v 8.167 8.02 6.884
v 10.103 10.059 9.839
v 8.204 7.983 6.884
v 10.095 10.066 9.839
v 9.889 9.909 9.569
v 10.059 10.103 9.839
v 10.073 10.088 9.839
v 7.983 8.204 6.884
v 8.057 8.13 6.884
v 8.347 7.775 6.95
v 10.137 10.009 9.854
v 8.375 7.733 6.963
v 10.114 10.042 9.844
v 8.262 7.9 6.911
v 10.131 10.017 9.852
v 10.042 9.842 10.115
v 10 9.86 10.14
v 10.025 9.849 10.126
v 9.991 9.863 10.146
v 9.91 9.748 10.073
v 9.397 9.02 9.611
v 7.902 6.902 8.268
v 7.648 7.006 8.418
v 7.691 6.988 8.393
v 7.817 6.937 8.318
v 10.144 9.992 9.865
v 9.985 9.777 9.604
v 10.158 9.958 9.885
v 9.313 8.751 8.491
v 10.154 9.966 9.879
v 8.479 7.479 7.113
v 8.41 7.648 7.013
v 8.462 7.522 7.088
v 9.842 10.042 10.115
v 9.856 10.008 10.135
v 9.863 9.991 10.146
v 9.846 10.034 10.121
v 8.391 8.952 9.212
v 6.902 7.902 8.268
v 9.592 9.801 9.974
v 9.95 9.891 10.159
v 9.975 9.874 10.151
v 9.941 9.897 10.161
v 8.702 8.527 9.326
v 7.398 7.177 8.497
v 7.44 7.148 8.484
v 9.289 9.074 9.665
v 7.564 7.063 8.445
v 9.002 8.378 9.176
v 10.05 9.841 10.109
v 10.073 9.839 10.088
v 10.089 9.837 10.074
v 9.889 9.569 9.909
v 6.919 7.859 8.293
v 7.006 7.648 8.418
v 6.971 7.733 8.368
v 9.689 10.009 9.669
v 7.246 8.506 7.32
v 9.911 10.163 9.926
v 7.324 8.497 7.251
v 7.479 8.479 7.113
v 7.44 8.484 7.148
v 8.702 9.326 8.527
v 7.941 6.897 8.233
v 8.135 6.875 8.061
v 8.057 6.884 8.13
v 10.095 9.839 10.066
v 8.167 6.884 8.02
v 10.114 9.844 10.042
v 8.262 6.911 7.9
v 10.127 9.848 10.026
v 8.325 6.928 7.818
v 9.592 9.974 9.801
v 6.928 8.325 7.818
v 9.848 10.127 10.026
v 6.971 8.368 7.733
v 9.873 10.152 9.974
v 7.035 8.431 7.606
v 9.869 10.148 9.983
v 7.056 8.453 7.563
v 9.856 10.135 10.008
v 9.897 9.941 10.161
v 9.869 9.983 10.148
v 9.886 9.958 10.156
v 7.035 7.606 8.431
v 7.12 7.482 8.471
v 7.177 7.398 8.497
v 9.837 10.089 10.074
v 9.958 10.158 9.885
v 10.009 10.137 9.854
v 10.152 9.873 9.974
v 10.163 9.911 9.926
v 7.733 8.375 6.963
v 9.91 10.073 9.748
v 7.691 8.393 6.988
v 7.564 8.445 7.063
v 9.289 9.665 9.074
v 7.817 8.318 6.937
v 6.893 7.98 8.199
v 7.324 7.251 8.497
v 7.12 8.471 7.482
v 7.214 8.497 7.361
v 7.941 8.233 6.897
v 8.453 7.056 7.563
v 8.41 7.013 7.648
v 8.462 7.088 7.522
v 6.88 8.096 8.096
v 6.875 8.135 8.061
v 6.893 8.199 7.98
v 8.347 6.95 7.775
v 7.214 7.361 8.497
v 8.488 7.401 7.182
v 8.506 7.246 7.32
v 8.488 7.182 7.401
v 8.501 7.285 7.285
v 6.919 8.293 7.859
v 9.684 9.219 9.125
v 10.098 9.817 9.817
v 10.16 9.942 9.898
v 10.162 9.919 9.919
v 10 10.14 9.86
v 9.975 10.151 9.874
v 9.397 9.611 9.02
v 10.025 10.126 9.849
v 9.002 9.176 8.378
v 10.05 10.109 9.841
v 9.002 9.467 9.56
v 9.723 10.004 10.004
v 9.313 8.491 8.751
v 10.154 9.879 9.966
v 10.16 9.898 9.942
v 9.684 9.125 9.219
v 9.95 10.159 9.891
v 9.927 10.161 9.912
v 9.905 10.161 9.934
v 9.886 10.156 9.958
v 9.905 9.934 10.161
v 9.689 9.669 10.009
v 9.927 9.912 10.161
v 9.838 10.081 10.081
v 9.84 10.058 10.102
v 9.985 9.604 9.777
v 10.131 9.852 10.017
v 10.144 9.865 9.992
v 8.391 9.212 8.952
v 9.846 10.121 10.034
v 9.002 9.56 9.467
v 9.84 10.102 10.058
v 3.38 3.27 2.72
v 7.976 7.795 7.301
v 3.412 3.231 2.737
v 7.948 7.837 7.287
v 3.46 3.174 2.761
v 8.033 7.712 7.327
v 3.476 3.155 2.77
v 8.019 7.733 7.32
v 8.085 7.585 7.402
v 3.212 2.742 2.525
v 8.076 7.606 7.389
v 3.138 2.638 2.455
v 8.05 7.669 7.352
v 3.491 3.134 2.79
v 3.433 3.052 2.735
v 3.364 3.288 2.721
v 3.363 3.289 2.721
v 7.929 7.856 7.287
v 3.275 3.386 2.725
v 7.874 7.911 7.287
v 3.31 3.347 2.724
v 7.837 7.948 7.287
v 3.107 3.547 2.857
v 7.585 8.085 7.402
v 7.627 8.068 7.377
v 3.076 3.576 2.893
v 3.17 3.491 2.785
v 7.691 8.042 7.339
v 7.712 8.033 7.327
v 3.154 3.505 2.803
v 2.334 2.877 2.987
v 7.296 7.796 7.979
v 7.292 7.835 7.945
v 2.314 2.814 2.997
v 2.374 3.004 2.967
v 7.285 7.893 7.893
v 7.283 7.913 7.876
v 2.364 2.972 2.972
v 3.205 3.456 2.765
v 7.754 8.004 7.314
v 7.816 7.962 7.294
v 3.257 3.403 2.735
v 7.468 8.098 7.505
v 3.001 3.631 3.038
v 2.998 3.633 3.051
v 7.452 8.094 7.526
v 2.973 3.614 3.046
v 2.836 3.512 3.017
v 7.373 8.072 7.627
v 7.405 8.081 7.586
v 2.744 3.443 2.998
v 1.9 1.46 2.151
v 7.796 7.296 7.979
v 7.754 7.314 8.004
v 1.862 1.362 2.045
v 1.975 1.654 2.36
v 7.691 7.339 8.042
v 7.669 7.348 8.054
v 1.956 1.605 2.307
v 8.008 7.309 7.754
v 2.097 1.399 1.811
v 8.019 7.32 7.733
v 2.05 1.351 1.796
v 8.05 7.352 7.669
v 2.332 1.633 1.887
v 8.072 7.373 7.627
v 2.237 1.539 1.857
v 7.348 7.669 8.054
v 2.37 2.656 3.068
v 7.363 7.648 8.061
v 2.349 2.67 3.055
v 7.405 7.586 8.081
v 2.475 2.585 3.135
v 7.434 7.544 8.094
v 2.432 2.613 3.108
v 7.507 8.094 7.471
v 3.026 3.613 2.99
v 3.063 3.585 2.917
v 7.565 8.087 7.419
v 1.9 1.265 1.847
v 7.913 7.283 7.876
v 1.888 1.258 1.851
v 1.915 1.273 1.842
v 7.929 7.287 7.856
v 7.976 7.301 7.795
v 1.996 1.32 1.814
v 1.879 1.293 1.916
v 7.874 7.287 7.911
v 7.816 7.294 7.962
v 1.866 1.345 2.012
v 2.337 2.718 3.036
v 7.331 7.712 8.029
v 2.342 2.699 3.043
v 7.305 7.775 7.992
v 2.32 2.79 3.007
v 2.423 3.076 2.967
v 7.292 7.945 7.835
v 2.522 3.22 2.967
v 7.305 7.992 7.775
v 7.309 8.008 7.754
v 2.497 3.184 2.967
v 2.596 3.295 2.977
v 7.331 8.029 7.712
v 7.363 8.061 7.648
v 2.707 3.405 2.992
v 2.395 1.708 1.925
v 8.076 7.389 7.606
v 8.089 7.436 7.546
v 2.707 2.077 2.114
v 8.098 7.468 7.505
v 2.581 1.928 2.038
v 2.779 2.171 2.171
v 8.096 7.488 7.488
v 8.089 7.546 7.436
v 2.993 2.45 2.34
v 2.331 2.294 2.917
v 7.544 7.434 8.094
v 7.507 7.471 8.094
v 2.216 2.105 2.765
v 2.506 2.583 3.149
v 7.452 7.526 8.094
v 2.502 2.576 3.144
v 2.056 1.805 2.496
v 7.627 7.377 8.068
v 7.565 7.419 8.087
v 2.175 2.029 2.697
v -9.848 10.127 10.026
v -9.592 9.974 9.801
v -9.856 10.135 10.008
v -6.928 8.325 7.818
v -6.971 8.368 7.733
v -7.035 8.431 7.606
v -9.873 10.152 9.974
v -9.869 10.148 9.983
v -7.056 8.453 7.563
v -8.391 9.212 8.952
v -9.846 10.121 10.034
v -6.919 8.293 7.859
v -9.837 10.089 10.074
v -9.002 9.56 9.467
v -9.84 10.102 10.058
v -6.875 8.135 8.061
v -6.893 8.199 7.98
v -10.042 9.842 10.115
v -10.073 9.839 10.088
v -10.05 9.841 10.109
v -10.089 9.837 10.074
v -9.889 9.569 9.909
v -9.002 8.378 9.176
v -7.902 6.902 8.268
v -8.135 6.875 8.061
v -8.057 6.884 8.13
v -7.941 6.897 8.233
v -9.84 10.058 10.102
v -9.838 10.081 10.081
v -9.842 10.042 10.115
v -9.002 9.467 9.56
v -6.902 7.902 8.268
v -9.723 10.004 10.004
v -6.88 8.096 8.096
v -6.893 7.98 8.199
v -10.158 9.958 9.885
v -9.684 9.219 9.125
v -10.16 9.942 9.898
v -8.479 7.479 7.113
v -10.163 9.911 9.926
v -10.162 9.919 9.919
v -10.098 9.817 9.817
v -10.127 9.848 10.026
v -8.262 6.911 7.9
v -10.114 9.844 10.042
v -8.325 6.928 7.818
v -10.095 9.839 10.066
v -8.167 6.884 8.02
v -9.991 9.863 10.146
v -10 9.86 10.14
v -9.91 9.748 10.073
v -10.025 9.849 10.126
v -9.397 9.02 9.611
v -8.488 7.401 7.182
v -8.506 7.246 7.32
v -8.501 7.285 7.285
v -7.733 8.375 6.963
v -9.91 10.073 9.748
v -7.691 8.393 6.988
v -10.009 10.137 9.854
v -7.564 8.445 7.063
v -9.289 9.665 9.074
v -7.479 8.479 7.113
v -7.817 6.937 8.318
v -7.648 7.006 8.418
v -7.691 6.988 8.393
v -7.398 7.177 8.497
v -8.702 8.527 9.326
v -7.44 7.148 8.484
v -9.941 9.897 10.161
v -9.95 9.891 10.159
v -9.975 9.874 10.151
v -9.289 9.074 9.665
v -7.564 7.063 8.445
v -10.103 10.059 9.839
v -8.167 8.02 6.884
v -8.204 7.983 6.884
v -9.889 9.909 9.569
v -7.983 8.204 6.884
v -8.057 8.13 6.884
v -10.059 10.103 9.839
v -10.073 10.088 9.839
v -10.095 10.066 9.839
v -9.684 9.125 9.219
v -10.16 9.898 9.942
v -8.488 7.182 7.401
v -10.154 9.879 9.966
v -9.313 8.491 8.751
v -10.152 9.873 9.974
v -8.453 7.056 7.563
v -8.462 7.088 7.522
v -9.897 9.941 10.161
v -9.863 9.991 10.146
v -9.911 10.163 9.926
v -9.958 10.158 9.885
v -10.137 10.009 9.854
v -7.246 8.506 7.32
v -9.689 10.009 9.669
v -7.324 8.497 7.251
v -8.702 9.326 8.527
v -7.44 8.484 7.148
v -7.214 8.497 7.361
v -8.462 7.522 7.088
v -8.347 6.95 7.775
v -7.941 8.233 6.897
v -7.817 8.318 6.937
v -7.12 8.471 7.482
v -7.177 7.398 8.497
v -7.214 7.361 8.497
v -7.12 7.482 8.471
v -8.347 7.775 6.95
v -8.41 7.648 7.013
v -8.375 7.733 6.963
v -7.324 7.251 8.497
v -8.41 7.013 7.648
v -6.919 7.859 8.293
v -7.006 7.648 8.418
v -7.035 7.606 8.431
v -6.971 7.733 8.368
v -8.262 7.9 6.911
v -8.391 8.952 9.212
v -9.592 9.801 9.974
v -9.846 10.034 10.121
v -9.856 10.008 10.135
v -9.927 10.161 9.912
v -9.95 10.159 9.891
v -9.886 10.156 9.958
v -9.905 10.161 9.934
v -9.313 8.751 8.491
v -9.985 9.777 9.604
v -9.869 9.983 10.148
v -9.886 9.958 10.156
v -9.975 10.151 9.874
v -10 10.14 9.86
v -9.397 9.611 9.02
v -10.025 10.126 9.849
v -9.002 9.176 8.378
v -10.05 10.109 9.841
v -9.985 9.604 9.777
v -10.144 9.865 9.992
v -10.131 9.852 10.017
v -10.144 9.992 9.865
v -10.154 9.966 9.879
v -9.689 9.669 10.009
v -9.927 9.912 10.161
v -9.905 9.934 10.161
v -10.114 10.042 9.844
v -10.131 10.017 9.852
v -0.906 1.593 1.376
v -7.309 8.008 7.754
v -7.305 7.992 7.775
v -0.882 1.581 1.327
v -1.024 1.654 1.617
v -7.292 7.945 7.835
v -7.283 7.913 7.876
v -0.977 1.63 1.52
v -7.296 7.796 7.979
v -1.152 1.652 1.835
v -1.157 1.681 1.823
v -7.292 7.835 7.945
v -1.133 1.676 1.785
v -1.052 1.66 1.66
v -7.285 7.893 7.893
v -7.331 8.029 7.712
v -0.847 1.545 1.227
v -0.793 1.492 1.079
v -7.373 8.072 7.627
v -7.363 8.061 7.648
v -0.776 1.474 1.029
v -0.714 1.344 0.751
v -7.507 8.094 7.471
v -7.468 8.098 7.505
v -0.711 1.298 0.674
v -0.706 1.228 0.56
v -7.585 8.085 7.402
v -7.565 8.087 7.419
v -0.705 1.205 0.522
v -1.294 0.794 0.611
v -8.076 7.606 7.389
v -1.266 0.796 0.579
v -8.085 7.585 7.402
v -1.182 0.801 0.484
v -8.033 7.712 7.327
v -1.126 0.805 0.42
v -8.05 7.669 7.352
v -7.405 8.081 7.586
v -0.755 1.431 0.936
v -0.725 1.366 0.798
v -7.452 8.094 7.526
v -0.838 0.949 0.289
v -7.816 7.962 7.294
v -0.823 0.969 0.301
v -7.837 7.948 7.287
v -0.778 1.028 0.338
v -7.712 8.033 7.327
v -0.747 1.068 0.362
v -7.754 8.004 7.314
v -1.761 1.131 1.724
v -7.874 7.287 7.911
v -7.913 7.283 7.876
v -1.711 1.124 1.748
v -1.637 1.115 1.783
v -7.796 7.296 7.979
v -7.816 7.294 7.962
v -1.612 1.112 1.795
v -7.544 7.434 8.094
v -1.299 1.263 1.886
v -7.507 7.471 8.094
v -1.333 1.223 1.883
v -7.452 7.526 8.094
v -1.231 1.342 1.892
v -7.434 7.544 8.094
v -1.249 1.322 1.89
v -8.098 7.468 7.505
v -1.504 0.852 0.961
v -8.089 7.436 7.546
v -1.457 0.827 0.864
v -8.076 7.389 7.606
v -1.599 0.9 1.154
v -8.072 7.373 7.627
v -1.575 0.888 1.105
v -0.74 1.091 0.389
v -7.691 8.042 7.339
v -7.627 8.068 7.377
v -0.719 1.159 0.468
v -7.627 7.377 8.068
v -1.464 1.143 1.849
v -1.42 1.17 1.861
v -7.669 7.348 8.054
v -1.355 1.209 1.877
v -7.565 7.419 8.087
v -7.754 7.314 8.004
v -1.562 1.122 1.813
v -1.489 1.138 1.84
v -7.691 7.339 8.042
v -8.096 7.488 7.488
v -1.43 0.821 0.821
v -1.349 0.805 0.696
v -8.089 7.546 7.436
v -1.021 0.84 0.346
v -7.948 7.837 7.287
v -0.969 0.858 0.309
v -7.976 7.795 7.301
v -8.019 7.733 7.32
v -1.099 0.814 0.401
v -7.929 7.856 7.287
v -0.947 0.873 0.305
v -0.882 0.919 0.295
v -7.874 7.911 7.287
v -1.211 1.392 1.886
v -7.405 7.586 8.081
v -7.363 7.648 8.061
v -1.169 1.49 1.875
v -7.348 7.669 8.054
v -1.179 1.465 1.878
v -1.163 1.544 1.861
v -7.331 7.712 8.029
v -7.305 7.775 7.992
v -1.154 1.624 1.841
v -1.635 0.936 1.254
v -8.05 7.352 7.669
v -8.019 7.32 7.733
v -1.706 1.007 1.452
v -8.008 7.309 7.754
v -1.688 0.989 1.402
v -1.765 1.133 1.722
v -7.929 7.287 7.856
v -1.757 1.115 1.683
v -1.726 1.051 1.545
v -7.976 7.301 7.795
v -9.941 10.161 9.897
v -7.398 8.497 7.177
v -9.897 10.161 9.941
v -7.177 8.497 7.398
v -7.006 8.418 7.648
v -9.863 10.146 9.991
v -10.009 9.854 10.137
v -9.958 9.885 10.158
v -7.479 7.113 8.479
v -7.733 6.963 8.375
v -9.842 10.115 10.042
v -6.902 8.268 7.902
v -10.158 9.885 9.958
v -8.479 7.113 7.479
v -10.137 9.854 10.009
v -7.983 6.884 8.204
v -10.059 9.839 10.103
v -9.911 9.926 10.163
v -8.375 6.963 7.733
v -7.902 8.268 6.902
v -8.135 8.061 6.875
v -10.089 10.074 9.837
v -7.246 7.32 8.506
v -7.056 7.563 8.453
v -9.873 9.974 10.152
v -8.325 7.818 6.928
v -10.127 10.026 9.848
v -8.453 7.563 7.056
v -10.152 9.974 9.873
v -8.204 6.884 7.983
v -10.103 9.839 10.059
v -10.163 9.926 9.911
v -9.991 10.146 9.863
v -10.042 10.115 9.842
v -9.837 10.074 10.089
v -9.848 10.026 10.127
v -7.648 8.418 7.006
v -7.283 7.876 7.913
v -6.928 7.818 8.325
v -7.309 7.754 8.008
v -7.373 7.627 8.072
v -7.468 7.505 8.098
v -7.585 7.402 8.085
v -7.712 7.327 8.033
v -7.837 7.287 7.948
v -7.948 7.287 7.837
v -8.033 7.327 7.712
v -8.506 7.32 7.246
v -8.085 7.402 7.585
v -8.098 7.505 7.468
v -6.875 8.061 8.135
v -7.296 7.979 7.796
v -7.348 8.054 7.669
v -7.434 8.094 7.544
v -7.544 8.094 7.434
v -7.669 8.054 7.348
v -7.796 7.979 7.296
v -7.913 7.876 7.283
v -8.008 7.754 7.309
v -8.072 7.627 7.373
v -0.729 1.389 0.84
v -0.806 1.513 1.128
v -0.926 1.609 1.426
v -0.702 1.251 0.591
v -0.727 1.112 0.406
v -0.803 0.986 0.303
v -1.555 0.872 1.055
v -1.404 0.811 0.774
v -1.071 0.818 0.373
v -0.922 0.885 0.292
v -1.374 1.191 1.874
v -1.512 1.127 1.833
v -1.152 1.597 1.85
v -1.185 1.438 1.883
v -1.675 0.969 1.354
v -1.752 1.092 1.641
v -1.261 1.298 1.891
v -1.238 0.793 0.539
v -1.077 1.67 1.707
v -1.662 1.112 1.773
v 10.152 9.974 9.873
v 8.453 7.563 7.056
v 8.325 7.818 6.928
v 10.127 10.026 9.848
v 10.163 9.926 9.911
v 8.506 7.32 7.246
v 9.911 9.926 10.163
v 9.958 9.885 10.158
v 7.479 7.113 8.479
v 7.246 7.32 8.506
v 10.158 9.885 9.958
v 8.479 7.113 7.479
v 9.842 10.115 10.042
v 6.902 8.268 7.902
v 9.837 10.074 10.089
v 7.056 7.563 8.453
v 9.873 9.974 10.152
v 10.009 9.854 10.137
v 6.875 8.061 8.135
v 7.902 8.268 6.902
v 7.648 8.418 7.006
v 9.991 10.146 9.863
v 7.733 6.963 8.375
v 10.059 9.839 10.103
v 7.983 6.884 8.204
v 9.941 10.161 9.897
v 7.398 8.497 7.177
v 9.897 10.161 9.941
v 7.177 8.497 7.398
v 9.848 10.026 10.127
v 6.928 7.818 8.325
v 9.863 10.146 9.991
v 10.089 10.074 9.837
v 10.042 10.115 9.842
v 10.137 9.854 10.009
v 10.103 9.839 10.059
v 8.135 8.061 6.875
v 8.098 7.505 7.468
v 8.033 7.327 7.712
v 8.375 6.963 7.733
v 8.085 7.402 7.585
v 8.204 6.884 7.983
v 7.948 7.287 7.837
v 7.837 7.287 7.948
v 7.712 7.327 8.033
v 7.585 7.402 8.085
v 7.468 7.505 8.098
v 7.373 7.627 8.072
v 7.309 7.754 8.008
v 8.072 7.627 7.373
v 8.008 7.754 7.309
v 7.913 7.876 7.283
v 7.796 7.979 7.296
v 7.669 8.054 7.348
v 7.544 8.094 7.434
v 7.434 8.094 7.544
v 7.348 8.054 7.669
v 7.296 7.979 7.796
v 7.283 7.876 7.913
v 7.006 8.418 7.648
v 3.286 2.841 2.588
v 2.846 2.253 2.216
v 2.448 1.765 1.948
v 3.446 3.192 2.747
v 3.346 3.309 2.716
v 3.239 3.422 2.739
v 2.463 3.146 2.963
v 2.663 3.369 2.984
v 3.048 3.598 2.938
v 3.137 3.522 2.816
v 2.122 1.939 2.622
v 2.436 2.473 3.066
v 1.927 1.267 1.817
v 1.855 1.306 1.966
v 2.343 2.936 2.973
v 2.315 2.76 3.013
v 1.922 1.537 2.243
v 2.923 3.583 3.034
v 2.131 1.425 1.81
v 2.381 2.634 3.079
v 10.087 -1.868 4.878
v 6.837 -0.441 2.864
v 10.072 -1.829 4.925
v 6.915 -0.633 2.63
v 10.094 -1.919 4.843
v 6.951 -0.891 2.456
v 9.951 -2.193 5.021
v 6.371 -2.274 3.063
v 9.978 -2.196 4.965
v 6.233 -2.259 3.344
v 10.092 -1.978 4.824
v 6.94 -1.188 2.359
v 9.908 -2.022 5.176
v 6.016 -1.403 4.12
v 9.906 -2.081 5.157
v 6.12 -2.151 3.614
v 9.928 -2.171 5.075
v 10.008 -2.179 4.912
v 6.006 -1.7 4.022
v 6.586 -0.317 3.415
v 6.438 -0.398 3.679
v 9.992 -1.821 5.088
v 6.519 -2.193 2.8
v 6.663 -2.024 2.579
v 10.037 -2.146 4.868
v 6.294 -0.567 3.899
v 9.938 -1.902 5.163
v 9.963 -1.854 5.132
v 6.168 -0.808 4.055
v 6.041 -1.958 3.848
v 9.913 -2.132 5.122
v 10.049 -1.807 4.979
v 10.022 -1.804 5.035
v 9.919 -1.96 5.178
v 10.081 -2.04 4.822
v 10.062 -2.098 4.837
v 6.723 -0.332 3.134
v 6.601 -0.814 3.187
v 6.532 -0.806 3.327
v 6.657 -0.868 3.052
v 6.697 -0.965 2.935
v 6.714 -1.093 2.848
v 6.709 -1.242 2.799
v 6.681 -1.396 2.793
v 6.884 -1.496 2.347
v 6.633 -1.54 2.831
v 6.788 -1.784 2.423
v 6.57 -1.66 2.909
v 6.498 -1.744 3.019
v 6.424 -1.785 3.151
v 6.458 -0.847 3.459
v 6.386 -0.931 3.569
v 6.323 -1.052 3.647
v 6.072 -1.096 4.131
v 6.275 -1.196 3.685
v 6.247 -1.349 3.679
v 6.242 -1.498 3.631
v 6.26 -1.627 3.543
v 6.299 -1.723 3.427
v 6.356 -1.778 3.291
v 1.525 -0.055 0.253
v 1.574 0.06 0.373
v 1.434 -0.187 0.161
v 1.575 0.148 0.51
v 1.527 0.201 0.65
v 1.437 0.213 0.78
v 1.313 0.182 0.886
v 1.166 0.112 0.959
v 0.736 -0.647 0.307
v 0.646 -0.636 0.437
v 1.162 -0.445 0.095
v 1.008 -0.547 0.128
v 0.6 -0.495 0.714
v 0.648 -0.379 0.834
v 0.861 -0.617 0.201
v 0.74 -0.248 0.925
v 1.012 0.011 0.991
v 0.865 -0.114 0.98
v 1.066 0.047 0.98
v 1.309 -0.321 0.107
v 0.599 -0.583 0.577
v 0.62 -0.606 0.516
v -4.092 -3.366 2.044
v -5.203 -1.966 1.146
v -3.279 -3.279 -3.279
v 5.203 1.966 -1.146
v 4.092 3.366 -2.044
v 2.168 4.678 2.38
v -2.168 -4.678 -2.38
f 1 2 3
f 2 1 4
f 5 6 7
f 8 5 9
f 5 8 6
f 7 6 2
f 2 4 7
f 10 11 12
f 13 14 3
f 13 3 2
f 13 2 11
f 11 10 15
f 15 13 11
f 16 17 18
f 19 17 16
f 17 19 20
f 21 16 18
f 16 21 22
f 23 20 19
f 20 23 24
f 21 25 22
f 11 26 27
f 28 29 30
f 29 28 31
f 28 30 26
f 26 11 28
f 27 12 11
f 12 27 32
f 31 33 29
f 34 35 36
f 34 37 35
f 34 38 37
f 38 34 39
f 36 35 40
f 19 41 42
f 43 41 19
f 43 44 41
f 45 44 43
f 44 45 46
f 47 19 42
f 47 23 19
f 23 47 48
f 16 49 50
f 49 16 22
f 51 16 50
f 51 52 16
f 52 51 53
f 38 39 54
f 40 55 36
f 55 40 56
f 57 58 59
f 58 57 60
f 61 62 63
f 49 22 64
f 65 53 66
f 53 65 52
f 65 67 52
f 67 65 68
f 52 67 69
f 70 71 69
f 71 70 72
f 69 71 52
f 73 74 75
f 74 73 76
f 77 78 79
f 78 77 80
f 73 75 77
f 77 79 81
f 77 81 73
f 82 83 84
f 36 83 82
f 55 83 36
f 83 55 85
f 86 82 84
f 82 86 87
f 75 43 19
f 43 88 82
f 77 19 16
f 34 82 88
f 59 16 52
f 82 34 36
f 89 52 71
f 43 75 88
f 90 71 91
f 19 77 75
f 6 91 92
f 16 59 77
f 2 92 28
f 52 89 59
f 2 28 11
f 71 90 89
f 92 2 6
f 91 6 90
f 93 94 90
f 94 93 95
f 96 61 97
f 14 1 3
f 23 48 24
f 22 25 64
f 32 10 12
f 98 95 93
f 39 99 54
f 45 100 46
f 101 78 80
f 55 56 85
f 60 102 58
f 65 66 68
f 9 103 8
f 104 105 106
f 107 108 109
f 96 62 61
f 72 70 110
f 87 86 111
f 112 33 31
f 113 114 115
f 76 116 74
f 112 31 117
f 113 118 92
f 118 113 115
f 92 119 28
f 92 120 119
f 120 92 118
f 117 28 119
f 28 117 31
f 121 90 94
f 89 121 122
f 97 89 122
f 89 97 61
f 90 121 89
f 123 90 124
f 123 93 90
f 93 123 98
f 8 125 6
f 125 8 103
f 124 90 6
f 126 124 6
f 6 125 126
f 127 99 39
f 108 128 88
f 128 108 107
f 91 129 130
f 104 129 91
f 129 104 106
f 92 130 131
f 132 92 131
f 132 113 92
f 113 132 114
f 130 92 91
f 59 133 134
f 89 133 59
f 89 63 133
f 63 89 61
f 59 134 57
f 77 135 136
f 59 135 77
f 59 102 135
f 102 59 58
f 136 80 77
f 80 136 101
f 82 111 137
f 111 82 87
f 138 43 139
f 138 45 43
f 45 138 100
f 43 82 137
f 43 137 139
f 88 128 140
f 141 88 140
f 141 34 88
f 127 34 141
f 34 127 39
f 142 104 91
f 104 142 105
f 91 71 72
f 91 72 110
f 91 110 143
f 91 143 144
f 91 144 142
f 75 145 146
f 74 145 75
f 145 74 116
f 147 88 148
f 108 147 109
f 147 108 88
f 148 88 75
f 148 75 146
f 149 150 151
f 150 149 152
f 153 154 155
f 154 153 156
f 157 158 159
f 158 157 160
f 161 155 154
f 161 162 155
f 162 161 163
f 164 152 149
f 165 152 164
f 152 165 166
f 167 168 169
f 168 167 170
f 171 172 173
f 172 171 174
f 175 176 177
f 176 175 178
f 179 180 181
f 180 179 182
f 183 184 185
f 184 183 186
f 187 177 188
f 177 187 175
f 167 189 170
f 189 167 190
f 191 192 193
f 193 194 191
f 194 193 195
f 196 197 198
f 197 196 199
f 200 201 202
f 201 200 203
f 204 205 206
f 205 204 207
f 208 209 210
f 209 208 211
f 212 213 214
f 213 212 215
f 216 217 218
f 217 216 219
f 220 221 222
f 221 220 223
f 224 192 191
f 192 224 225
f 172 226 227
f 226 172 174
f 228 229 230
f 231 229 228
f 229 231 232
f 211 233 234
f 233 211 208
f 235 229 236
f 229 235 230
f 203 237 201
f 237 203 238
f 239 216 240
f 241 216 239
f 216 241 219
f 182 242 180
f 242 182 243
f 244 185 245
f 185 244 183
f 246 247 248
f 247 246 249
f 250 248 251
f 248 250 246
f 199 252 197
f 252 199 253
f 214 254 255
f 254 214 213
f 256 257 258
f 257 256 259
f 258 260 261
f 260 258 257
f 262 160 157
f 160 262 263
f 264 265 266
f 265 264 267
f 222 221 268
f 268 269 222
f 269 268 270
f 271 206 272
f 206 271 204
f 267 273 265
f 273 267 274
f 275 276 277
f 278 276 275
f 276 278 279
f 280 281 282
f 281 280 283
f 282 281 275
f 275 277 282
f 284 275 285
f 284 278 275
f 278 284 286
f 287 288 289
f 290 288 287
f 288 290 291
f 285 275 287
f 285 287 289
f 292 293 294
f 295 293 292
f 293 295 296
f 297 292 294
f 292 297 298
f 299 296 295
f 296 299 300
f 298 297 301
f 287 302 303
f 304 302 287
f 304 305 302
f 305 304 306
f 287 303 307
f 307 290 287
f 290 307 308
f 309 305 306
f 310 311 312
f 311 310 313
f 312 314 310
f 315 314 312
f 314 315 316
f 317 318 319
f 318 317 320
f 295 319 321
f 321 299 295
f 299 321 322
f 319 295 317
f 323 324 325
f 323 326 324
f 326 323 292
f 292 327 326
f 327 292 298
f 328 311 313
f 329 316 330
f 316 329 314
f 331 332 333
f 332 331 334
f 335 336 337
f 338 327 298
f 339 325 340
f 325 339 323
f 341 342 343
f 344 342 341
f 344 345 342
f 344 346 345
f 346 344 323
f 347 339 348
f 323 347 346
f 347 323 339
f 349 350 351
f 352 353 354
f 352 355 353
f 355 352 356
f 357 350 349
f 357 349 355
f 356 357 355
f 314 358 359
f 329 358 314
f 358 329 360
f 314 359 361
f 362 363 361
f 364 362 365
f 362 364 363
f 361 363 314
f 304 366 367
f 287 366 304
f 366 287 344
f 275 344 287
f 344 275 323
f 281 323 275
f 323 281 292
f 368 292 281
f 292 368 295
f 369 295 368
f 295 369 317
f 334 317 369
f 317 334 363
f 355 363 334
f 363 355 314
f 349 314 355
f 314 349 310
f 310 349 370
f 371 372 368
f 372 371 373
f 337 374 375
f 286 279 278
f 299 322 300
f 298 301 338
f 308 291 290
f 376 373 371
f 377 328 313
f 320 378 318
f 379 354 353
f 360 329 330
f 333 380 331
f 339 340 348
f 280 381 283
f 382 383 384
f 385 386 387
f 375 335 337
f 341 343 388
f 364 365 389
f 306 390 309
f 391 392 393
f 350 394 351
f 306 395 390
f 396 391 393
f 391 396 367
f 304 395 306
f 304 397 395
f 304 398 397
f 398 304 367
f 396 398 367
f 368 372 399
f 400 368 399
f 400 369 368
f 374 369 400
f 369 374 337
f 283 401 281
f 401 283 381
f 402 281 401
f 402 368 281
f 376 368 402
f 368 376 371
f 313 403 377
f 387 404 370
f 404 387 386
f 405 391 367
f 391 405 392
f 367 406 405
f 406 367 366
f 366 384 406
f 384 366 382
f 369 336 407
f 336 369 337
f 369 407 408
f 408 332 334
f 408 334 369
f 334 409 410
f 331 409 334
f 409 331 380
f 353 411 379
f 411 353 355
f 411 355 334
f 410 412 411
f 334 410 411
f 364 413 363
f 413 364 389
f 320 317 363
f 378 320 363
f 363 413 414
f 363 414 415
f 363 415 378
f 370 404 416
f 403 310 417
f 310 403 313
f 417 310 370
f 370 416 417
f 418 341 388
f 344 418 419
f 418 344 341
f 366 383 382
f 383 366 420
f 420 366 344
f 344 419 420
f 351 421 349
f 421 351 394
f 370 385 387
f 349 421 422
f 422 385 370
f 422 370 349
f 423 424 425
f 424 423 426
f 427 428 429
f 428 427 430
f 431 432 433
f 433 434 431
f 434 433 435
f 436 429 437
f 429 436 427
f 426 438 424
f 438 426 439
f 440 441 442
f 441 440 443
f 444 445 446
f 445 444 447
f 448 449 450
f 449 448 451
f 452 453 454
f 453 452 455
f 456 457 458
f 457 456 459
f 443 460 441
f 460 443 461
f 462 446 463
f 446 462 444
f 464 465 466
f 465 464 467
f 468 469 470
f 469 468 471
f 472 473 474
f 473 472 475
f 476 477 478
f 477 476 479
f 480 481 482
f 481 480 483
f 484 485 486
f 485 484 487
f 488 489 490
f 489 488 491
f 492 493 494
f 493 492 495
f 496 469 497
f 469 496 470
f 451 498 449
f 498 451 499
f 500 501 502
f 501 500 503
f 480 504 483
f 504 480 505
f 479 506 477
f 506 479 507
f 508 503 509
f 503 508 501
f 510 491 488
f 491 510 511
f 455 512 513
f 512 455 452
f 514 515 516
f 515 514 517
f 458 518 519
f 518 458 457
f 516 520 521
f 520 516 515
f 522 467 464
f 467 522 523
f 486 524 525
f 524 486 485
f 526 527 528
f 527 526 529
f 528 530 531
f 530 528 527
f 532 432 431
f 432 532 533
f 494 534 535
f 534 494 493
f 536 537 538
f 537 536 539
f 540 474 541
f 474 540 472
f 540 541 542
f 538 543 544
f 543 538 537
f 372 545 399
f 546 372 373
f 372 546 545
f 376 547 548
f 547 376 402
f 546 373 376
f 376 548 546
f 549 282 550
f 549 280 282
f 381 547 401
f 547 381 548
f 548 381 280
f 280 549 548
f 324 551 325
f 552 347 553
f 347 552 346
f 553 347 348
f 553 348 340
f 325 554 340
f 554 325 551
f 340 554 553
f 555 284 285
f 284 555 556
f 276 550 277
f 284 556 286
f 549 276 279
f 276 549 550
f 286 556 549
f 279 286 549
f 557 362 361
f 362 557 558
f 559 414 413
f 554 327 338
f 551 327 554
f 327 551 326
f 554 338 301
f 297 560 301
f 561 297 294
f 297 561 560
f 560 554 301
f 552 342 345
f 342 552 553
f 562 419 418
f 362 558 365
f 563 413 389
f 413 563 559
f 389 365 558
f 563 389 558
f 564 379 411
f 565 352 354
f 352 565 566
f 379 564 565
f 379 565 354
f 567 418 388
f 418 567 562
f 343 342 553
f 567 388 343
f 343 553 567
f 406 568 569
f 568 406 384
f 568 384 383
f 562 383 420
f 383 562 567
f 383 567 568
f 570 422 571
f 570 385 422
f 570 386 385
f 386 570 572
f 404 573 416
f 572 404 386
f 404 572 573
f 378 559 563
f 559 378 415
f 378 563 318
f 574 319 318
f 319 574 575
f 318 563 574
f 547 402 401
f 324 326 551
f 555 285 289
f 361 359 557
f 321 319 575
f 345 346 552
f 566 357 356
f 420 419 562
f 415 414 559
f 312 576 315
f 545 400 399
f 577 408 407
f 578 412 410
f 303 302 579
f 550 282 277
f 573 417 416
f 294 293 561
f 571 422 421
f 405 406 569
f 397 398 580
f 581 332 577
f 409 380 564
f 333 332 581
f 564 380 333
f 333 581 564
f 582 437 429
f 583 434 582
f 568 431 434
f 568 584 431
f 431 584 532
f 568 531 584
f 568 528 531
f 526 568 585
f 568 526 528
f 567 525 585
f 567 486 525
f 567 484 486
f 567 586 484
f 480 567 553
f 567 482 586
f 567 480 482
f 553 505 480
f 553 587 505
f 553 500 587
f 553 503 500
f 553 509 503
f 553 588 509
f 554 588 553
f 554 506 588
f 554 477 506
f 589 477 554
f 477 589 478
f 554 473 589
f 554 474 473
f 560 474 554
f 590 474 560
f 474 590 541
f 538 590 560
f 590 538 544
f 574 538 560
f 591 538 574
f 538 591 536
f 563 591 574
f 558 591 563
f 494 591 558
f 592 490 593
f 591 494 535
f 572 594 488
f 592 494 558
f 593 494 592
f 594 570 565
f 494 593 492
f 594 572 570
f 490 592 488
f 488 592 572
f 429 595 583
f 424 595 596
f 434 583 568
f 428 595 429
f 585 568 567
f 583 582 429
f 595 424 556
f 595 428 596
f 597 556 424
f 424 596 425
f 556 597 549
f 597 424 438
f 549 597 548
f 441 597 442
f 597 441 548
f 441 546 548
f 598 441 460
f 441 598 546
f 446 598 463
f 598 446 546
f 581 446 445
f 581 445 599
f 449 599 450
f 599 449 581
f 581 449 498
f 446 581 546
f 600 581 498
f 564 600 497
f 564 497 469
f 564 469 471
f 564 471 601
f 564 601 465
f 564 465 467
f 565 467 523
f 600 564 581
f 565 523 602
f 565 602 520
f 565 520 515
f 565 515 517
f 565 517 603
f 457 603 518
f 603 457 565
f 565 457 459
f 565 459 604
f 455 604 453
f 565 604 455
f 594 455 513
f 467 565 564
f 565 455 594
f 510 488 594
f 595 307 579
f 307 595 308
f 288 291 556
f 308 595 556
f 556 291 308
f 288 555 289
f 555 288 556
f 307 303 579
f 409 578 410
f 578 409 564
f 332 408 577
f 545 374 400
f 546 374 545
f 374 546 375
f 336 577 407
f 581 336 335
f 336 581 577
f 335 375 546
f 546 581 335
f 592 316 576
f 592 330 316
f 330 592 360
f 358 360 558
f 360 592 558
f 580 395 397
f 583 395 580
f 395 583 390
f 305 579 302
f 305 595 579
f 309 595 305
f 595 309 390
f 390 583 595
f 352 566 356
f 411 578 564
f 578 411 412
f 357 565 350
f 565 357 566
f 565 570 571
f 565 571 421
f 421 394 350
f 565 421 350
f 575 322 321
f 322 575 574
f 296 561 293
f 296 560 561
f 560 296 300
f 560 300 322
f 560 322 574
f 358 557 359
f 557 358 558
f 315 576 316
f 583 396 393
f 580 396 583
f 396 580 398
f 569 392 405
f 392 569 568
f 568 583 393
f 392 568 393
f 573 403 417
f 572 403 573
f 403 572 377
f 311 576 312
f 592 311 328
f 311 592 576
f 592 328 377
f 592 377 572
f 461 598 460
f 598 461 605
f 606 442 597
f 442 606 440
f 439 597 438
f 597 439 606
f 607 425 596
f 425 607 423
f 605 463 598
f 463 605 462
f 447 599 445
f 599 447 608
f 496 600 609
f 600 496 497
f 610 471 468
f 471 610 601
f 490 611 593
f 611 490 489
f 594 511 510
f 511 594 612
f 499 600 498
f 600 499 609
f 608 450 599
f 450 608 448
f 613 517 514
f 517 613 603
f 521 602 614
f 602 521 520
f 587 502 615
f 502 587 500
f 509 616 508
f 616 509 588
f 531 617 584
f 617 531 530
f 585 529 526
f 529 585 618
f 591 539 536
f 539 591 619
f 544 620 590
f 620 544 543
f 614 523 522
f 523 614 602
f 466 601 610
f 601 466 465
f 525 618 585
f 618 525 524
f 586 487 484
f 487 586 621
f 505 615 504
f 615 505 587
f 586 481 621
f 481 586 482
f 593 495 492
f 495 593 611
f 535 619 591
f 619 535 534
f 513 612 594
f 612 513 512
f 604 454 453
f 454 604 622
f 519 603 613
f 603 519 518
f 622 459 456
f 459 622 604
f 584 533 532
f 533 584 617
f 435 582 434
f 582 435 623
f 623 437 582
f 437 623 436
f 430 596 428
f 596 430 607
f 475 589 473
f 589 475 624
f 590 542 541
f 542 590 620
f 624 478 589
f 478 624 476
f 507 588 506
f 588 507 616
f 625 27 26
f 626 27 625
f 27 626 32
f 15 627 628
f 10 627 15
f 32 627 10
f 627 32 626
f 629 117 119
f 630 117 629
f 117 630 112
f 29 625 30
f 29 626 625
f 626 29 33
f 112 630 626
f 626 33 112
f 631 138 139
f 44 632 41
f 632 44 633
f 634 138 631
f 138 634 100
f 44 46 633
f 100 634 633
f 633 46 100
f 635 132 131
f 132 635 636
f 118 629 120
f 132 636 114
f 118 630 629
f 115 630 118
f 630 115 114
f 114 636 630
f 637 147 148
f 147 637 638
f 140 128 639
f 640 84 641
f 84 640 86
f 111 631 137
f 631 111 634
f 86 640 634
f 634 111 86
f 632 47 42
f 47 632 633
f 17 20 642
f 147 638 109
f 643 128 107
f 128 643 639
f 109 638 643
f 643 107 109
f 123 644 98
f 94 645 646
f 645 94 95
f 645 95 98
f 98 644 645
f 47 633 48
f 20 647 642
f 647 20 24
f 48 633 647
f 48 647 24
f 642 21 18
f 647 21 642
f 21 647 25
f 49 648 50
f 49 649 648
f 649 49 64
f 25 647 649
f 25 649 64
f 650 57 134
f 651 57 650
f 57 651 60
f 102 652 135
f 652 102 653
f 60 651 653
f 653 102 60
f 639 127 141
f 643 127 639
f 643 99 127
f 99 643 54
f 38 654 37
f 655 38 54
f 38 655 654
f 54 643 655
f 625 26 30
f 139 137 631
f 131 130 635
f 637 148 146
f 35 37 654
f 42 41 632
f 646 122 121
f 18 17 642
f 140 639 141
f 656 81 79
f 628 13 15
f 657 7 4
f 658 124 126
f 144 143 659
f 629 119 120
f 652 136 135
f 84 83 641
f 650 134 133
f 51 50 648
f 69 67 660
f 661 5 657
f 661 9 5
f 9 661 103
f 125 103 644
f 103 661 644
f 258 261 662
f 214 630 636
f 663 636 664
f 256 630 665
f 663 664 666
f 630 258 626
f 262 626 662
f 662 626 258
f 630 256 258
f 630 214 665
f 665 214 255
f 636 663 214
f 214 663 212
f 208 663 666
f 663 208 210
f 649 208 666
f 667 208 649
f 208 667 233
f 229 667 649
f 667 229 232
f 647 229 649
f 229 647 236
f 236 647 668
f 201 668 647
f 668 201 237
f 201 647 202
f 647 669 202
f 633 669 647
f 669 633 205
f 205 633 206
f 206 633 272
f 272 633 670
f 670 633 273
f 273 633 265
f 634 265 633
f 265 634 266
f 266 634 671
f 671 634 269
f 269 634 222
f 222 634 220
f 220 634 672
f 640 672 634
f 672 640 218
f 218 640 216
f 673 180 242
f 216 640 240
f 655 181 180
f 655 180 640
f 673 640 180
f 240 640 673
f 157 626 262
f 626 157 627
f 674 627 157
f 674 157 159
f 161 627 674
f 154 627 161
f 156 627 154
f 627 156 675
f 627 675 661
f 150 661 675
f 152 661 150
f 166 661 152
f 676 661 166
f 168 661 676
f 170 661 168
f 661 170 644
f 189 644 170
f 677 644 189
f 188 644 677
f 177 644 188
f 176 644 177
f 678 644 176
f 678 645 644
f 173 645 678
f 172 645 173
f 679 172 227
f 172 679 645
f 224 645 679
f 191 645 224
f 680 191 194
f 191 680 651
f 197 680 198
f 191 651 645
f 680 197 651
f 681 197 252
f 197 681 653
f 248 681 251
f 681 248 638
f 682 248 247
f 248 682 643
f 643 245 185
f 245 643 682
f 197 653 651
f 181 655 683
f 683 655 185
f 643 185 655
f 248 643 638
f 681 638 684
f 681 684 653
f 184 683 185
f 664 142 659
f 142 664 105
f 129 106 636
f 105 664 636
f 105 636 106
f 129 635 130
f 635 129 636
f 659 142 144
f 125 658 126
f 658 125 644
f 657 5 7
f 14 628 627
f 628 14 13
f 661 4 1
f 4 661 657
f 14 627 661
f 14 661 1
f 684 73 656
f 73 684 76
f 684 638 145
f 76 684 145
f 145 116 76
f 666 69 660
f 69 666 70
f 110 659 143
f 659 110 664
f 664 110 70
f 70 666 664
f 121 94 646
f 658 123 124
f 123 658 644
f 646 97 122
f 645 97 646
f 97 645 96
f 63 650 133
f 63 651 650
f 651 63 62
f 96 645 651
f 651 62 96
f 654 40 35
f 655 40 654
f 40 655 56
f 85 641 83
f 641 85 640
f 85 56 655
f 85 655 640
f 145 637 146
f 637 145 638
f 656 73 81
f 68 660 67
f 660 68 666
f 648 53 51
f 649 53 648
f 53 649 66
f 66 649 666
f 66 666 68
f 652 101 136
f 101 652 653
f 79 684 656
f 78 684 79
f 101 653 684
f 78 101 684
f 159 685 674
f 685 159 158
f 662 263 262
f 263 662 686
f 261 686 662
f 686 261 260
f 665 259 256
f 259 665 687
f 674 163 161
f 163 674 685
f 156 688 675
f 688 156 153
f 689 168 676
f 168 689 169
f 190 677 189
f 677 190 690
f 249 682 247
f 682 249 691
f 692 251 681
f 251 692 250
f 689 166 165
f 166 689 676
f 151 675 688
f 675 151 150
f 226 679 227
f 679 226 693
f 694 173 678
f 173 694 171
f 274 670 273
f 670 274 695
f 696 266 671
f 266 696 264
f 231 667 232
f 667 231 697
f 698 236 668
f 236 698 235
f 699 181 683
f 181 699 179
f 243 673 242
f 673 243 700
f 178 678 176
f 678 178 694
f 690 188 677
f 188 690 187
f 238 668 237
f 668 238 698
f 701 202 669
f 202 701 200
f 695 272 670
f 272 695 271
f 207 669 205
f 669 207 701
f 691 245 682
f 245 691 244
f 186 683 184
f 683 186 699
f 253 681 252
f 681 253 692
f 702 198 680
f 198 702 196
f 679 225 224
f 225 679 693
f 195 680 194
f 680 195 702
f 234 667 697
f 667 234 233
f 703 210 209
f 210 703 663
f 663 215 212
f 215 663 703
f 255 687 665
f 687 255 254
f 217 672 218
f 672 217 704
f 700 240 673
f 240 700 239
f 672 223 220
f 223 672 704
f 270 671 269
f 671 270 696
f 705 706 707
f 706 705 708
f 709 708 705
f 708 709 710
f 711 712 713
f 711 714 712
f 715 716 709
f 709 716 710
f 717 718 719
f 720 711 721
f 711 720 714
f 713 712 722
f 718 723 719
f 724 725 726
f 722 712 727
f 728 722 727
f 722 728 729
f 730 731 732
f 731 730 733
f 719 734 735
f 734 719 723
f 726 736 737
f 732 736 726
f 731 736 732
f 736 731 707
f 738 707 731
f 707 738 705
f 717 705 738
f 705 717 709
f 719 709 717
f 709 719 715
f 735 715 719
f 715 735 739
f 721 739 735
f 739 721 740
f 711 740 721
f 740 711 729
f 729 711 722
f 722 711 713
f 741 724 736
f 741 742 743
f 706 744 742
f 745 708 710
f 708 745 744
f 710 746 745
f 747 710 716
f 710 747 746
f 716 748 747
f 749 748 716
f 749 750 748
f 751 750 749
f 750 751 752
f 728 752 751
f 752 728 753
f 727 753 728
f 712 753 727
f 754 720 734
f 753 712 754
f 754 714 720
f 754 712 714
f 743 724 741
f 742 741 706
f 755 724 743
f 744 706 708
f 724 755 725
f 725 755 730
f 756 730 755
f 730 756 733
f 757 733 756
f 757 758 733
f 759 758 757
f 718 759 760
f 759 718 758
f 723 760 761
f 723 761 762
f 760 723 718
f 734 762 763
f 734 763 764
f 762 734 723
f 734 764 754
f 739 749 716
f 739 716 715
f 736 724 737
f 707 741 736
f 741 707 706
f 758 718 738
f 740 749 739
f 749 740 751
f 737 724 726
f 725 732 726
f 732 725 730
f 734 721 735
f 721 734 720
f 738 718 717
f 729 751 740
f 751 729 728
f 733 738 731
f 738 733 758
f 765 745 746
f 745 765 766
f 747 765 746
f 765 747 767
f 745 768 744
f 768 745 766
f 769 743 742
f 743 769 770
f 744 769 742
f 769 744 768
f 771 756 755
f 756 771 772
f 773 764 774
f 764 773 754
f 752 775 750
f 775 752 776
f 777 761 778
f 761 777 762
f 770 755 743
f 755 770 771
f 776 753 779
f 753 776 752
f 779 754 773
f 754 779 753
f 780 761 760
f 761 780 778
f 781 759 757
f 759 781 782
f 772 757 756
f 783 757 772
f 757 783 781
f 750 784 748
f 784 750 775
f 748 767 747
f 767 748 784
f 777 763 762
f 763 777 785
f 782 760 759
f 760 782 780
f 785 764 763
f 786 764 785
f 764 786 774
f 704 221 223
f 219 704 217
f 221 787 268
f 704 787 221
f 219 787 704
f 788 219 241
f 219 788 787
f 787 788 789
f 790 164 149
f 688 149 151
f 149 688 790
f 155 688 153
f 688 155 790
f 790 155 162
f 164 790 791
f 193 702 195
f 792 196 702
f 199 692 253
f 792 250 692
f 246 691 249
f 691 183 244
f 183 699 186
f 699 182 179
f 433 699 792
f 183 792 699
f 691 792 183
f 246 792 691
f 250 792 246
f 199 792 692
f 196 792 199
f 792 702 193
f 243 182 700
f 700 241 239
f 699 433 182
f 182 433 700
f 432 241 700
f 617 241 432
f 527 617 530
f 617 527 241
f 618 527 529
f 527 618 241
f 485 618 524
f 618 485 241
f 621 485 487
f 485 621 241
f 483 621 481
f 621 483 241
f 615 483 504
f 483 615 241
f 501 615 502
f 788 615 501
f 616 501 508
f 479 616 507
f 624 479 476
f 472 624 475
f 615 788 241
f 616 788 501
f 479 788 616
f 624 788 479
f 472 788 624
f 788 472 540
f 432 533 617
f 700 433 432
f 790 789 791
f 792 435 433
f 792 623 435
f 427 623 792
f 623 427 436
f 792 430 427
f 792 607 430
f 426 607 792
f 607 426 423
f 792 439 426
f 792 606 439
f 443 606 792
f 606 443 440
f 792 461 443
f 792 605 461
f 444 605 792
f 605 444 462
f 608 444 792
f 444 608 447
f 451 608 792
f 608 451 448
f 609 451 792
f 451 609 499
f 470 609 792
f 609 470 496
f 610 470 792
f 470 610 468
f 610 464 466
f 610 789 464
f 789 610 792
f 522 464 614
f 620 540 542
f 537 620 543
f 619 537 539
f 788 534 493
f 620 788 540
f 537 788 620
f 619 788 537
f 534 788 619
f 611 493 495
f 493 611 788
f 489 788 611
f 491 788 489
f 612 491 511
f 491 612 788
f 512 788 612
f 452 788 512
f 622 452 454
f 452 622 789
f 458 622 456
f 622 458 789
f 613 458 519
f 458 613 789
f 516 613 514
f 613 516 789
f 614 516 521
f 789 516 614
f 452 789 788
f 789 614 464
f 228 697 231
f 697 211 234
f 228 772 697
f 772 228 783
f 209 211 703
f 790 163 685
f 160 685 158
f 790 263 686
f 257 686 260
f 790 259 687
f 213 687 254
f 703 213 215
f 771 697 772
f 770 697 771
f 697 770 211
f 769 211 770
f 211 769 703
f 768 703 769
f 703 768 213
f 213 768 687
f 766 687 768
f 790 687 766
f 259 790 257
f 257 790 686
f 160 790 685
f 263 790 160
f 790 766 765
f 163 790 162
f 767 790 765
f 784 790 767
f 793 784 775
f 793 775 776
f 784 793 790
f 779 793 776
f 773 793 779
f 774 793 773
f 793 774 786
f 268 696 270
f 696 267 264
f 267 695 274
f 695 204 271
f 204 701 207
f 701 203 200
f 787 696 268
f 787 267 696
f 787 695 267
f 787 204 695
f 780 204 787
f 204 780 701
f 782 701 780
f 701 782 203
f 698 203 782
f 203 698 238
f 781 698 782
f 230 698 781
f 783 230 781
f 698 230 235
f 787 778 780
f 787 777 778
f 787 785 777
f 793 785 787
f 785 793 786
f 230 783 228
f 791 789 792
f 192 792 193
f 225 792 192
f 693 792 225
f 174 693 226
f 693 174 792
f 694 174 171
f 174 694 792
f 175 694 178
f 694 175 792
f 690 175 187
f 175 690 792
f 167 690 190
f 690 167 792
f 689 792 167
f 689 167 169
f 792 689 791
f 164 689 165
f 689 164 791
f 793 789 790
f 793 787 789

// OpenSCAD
//---------------------------------------------------------------
//-- Openscad vector library
//-- This is a component of the obiscad opescad tools by Obijuan
//-- (C) Juan Gonzalez-Gomez (Obijuan)
//-- Sep-2012
//---------------------------------------------------------------
//-- Released under the GPL license
//---------------------------------------------------------------

//----------------------------------------
//-- FUNCTIONS FOR WORKING WITH VECTORS
//----------------------------------------

//-- Calculate the module of a vector
function mod(v) = (sqrt(v[0]*v[0]+v[1]*v[1]+v[2]*v[2]));

//-- Calculate the cros product of two vectors
function cross(u,v) = [
  u[1]*v[2] - v[1]*u[2],
  -(u[0]*v[2] - v[0]*u[2]) ,
  u[0]*v[1] - v[0]*u[1]];

//-- Calculate the dot product of two vectors
function dot(u,v) = u[0]*v[0]+u[1]*v[1]+u[2]*v[2];

//-- Return the unit vector of a vector
function unitv(v) = v/mod(v);

//-- Return the angle between two vectores
function anglev(u,v) = acos( dot(u,v) / (mod(u)*mod(v)) );

//----------------------------------------------------------
//--  Draw a point in the position given by the vector p  
//----------------------------------------------------------
module point(p)
{
  translate(p)
    sphere(r=0.7,$fn=20);
}

//------------------------------------------------------------------
//-- Draw a vector poiting to the z axis
//-- This is an auxiliary module for implementing the vector module
//--
//-- Parameters:
//--  l: total vector length (line + arrow)
//--  l_arrow: Vector arrow length
//--  mark: If true, a mark is draw in the vector head, for having
//--    a visual reference of the rolling angle
//------------------------------------------------------------------
module vectorz(l=10, l_arrow=4, mark=false)
{
  //-- vector body length (not including the arrow)
  lb = l - l_arrow;

  //-- The vector is locatead at 0,0,0
  translate([0,0,lb/2])
  union() {

    //-- Draw the arrow
    translate([0,0,lb/2])
      cylinder(r1=2/2, r2=0.2, h=l_arrow, $fn=20);

    //-- Draw the mark
    if (mark) {
      translate([0,0,lb/2+l_arrow/2])
      translate([1,0,0])
        cube([2,0.3,l_arrow*0.8],center=true);
    }

    //-- Draw the body
    cylinder(r=1/2, h=lb, center=true, $fn=20);
  }

  //-- Draw a sphere in the vector base
  sphere(r=1/2, $fn=20);
}

//-----------------------------------------------------------------
//-- ORIENTATE OPERATOR
//--
//--  Orientate an object to the direction given by the vector v
//--  Parameters:
//--    v : Target orientation
//--    vref: Vector reference. It is the vector of the local frame
//--          of the object that want to be poiting in the direction
//--          of v
//--    roll: Rotation of the object around the v axis
//-------------------------------------------------------------------
module orientate(v,vref=[0,0,1], roll=0)
{
  //-- Calculate the rotation axis
  raxis = cross(vref,v);
  
  //-- Calculate the angle between the vectors
  ang = anglev(vref,v);

  //-- Rotate the child!
  rotate(a=roll, v=v)
    rotate(a=ang, v=raxis)
      child(0);
}

//---------------------------------------------------------------------------
//-- Draw a vector 
//--
//-- There are two modes of drawing the vector
//-- * Mode 1: Given by a cartesian point(x,y,z). A vector from the origin
//--           to the end (x,y,z) is drawn. The l parameter (length) must 
//--           be 0  (l=0)
//-- * Mode 2: Give by direction and length
//--           A vector of length l pointing to the direction given by
//--           v is drawn
//---------------------------------------------------------------------------
//-- Parameters:
//--  v: Vector cartesian coordinates
//--  l: total vector length (line + arrow)
//--  l_arrow: Vector arrow length
//    mark: If true, a mark is draw in the vector head, for having
//--    a visual reference of the rolling angle
//---------------------------------------------------------------------------
module vector(v,l=0, l_arrow=4, mark=false)
{
  //-- Get the vector length from the coordinates
  mod = mod(v);

  //-- The vector is very easy implemented by means of the orientate
  //-- operator:
  //--  orientate(v) vectorz(l=mod, l_arrow=l_arrow)
  //--  BUT... in OPENSCAD 2012.02.22 the recursion does not
  //--    not work, so that if the user use the orientate operator
  //--    on a vector, openscad will ignore it..
  //-- The solution at the moment (I hope the openscad developers
  //--  implement the recursion in the near future...)
  //--  is to repite the orientate operation in this module

  //---- SAME CALCULATIONS THAN THE ORIENTATE OPERATOR!
  //-- Calculate the rotation axis

  vref = [0,0,1];
  raxis = cross(vref,v);
  
  //-- Calculate the angle between the vectors
  ang = anglev(vref,v);

  //-- orientate the vector
  //-- Draw the vector. The vector length is given either
  //--- by the mod variable (when l=0) or by l (when l!=0)
  if (l==0)
    rotate(a=ang, v=raxis)
      vectorz(l=mod, l_arrow=l_arrow, mark=mark);
  else
    rotate(a=ang, v=raxis)
      vectorz(l=l, l_arrow=l_arrow, mark=mark);

}

//----------------------------------------------------
//-- Draw a Frame of reference
//-- Parameters:
//-- l: length of the Unit vectors
//-----------------------------------------------------
module frame(l=10, l_arrow=4)
{

  //-- Z unit vector
  color("Blue")
    vector([0,0,l], l_arrow=l_arrow);

  //-- X unit vector
  color("Red")
    vector([l,0,0], l_arrow=l_arrow );

  //-- Y unit vector
  color("Green")
    vector([0,l,0],l_arrow=l_arrow);

  //-- Origin
  color("Gray")
    sphere(r=1, $fn=20);
}

//--------------------------------------------------
//-- Modules for testings and examples
//-- Testing that the vector library is working ok
//--------------------------------------------------

//-- 22 vectors in total are drawn, poiting to different directions
module Test_vectors1()
{

  a = 20;
  k = 1;

  //--  Add a frame of reference (in the origin)
  frame(l=a);

  //-- Negative vectors, pointing towards the three axis: -x, -y, -z
  color("Red")   vector([-a, 0,  0]);
  color("Green") vector([0, -a,  0]);
  color("Blue")  vector([0,  0, -a]);

  //-- It is *not* has been implemented using a for loop on purpose
  //-- This way, individual vectors can be commented out or highlighted

  //-- vectors with positive z
  vector([a,   a, a*k]);
  vector([0,   a, a*k]);
  vector([-a,  a, a*k]);
  vector([-a,  0, a*k]);

  vector([-a, -a, a*k]);
  vector([0,  -a, a*k]);
  vector([a,  -a, a*k]);
  vector([a,   0, a*k]);


  //-- Vectors with negative z
  vector([a,   a, -a*k]);
  vector([0,   a, -a*k]);
  vector([-a,  a, -a*k]);
  vector([-a,  0, -a*k]);

  vector([-a, -a, -a*k]);
  vector([0,  -a, -a*k]);
  vector([a,  -a, -a*k]);
  vector([a,   0, -a*k]);
}

//--- Another test...
module Test_vectors2()
{

  //-- Add the vector into the vector table
  //-- This vectors are taken as directions
  //-- All the vectors will be drawn with the same length (l)
  vector_table = [
    [1,   1, 1],
    [0,   1, 1],
    [-1,  1, 1],
    [-1,  0, 1],
    [-1, -1, 1],
    [0,  -1, 1],
    [1,  -1, 1],
    [1,   0, 1],
  
    [1,   1, -1],
    [0,   1, -1],
    [-1,  1, -1],
    [-1,  0, -1],
    [-1, -1, -1],
    [0,  -1, -1],
    [1,  -1, -1],
    [1,   0, -1],
  ];

  //-- Vector length
  l=20;

  frame(l=10);

  //-- Draw all the vector given in the table
  //-- The vectors point to the direction given in the table
  //-- They all are drawn with a length equal to l
  for (v=vector_table) {
    //-- Vector given by direction and length
    vector(v,l=l);
  }
}


//-- Test the cross product and the angle
//-- between vectors
module Test_vector3()
{
  //-- Start with 2 unit vectors
  v=unitv([1,1,1]);
  u=unitv([0,1,0]);

  //-- Draw the vector in different colors
  //-- Increase the length for drawing
  color("Red") vector(v*20);
  color("blue") vector(u*20);

  //-- Get the cross product
  w = cross(v,u);
  vector(w*20);

  //-- The cross product is NOT conmutative... 
  //-- change the order of v and u
  w2 = cross(u,v);
  vector(w2*20);

  //-- w should be perpendicular to v and u
  //-- Calculate the angles between them:
  echo("U , V: ", anglev(u,v));
  echo("W , U: ", anglev(w,u));
  echo("W , V: ", anglev(w,v));

}

//-- Test the orientate operator
module Test_vector4()
{
  o = [10,10,10];
  v = [-10,10,10];

  color("Red") vector(o);
  color("Blue") vector(v);

  //-- Orientate the vector o in the direction of v
  orientate(v,o)
    vector(o);

  //-- Inverse operation: orientate the v vector in the direction
  //-- of o
  orientate(o,v)
    vector(v);

  //-- Example of orientation of a cube
  orientate(o,vref=[10,-2,5],roll=0)
    cube([10,2,5],center=true);

  vector([10,-2,5]);

}

//-------- Perform tests......

Test_vector4();


/*

Test_vectors1();


translate([60,0,0]) 
  Test_vectors2();
*/
